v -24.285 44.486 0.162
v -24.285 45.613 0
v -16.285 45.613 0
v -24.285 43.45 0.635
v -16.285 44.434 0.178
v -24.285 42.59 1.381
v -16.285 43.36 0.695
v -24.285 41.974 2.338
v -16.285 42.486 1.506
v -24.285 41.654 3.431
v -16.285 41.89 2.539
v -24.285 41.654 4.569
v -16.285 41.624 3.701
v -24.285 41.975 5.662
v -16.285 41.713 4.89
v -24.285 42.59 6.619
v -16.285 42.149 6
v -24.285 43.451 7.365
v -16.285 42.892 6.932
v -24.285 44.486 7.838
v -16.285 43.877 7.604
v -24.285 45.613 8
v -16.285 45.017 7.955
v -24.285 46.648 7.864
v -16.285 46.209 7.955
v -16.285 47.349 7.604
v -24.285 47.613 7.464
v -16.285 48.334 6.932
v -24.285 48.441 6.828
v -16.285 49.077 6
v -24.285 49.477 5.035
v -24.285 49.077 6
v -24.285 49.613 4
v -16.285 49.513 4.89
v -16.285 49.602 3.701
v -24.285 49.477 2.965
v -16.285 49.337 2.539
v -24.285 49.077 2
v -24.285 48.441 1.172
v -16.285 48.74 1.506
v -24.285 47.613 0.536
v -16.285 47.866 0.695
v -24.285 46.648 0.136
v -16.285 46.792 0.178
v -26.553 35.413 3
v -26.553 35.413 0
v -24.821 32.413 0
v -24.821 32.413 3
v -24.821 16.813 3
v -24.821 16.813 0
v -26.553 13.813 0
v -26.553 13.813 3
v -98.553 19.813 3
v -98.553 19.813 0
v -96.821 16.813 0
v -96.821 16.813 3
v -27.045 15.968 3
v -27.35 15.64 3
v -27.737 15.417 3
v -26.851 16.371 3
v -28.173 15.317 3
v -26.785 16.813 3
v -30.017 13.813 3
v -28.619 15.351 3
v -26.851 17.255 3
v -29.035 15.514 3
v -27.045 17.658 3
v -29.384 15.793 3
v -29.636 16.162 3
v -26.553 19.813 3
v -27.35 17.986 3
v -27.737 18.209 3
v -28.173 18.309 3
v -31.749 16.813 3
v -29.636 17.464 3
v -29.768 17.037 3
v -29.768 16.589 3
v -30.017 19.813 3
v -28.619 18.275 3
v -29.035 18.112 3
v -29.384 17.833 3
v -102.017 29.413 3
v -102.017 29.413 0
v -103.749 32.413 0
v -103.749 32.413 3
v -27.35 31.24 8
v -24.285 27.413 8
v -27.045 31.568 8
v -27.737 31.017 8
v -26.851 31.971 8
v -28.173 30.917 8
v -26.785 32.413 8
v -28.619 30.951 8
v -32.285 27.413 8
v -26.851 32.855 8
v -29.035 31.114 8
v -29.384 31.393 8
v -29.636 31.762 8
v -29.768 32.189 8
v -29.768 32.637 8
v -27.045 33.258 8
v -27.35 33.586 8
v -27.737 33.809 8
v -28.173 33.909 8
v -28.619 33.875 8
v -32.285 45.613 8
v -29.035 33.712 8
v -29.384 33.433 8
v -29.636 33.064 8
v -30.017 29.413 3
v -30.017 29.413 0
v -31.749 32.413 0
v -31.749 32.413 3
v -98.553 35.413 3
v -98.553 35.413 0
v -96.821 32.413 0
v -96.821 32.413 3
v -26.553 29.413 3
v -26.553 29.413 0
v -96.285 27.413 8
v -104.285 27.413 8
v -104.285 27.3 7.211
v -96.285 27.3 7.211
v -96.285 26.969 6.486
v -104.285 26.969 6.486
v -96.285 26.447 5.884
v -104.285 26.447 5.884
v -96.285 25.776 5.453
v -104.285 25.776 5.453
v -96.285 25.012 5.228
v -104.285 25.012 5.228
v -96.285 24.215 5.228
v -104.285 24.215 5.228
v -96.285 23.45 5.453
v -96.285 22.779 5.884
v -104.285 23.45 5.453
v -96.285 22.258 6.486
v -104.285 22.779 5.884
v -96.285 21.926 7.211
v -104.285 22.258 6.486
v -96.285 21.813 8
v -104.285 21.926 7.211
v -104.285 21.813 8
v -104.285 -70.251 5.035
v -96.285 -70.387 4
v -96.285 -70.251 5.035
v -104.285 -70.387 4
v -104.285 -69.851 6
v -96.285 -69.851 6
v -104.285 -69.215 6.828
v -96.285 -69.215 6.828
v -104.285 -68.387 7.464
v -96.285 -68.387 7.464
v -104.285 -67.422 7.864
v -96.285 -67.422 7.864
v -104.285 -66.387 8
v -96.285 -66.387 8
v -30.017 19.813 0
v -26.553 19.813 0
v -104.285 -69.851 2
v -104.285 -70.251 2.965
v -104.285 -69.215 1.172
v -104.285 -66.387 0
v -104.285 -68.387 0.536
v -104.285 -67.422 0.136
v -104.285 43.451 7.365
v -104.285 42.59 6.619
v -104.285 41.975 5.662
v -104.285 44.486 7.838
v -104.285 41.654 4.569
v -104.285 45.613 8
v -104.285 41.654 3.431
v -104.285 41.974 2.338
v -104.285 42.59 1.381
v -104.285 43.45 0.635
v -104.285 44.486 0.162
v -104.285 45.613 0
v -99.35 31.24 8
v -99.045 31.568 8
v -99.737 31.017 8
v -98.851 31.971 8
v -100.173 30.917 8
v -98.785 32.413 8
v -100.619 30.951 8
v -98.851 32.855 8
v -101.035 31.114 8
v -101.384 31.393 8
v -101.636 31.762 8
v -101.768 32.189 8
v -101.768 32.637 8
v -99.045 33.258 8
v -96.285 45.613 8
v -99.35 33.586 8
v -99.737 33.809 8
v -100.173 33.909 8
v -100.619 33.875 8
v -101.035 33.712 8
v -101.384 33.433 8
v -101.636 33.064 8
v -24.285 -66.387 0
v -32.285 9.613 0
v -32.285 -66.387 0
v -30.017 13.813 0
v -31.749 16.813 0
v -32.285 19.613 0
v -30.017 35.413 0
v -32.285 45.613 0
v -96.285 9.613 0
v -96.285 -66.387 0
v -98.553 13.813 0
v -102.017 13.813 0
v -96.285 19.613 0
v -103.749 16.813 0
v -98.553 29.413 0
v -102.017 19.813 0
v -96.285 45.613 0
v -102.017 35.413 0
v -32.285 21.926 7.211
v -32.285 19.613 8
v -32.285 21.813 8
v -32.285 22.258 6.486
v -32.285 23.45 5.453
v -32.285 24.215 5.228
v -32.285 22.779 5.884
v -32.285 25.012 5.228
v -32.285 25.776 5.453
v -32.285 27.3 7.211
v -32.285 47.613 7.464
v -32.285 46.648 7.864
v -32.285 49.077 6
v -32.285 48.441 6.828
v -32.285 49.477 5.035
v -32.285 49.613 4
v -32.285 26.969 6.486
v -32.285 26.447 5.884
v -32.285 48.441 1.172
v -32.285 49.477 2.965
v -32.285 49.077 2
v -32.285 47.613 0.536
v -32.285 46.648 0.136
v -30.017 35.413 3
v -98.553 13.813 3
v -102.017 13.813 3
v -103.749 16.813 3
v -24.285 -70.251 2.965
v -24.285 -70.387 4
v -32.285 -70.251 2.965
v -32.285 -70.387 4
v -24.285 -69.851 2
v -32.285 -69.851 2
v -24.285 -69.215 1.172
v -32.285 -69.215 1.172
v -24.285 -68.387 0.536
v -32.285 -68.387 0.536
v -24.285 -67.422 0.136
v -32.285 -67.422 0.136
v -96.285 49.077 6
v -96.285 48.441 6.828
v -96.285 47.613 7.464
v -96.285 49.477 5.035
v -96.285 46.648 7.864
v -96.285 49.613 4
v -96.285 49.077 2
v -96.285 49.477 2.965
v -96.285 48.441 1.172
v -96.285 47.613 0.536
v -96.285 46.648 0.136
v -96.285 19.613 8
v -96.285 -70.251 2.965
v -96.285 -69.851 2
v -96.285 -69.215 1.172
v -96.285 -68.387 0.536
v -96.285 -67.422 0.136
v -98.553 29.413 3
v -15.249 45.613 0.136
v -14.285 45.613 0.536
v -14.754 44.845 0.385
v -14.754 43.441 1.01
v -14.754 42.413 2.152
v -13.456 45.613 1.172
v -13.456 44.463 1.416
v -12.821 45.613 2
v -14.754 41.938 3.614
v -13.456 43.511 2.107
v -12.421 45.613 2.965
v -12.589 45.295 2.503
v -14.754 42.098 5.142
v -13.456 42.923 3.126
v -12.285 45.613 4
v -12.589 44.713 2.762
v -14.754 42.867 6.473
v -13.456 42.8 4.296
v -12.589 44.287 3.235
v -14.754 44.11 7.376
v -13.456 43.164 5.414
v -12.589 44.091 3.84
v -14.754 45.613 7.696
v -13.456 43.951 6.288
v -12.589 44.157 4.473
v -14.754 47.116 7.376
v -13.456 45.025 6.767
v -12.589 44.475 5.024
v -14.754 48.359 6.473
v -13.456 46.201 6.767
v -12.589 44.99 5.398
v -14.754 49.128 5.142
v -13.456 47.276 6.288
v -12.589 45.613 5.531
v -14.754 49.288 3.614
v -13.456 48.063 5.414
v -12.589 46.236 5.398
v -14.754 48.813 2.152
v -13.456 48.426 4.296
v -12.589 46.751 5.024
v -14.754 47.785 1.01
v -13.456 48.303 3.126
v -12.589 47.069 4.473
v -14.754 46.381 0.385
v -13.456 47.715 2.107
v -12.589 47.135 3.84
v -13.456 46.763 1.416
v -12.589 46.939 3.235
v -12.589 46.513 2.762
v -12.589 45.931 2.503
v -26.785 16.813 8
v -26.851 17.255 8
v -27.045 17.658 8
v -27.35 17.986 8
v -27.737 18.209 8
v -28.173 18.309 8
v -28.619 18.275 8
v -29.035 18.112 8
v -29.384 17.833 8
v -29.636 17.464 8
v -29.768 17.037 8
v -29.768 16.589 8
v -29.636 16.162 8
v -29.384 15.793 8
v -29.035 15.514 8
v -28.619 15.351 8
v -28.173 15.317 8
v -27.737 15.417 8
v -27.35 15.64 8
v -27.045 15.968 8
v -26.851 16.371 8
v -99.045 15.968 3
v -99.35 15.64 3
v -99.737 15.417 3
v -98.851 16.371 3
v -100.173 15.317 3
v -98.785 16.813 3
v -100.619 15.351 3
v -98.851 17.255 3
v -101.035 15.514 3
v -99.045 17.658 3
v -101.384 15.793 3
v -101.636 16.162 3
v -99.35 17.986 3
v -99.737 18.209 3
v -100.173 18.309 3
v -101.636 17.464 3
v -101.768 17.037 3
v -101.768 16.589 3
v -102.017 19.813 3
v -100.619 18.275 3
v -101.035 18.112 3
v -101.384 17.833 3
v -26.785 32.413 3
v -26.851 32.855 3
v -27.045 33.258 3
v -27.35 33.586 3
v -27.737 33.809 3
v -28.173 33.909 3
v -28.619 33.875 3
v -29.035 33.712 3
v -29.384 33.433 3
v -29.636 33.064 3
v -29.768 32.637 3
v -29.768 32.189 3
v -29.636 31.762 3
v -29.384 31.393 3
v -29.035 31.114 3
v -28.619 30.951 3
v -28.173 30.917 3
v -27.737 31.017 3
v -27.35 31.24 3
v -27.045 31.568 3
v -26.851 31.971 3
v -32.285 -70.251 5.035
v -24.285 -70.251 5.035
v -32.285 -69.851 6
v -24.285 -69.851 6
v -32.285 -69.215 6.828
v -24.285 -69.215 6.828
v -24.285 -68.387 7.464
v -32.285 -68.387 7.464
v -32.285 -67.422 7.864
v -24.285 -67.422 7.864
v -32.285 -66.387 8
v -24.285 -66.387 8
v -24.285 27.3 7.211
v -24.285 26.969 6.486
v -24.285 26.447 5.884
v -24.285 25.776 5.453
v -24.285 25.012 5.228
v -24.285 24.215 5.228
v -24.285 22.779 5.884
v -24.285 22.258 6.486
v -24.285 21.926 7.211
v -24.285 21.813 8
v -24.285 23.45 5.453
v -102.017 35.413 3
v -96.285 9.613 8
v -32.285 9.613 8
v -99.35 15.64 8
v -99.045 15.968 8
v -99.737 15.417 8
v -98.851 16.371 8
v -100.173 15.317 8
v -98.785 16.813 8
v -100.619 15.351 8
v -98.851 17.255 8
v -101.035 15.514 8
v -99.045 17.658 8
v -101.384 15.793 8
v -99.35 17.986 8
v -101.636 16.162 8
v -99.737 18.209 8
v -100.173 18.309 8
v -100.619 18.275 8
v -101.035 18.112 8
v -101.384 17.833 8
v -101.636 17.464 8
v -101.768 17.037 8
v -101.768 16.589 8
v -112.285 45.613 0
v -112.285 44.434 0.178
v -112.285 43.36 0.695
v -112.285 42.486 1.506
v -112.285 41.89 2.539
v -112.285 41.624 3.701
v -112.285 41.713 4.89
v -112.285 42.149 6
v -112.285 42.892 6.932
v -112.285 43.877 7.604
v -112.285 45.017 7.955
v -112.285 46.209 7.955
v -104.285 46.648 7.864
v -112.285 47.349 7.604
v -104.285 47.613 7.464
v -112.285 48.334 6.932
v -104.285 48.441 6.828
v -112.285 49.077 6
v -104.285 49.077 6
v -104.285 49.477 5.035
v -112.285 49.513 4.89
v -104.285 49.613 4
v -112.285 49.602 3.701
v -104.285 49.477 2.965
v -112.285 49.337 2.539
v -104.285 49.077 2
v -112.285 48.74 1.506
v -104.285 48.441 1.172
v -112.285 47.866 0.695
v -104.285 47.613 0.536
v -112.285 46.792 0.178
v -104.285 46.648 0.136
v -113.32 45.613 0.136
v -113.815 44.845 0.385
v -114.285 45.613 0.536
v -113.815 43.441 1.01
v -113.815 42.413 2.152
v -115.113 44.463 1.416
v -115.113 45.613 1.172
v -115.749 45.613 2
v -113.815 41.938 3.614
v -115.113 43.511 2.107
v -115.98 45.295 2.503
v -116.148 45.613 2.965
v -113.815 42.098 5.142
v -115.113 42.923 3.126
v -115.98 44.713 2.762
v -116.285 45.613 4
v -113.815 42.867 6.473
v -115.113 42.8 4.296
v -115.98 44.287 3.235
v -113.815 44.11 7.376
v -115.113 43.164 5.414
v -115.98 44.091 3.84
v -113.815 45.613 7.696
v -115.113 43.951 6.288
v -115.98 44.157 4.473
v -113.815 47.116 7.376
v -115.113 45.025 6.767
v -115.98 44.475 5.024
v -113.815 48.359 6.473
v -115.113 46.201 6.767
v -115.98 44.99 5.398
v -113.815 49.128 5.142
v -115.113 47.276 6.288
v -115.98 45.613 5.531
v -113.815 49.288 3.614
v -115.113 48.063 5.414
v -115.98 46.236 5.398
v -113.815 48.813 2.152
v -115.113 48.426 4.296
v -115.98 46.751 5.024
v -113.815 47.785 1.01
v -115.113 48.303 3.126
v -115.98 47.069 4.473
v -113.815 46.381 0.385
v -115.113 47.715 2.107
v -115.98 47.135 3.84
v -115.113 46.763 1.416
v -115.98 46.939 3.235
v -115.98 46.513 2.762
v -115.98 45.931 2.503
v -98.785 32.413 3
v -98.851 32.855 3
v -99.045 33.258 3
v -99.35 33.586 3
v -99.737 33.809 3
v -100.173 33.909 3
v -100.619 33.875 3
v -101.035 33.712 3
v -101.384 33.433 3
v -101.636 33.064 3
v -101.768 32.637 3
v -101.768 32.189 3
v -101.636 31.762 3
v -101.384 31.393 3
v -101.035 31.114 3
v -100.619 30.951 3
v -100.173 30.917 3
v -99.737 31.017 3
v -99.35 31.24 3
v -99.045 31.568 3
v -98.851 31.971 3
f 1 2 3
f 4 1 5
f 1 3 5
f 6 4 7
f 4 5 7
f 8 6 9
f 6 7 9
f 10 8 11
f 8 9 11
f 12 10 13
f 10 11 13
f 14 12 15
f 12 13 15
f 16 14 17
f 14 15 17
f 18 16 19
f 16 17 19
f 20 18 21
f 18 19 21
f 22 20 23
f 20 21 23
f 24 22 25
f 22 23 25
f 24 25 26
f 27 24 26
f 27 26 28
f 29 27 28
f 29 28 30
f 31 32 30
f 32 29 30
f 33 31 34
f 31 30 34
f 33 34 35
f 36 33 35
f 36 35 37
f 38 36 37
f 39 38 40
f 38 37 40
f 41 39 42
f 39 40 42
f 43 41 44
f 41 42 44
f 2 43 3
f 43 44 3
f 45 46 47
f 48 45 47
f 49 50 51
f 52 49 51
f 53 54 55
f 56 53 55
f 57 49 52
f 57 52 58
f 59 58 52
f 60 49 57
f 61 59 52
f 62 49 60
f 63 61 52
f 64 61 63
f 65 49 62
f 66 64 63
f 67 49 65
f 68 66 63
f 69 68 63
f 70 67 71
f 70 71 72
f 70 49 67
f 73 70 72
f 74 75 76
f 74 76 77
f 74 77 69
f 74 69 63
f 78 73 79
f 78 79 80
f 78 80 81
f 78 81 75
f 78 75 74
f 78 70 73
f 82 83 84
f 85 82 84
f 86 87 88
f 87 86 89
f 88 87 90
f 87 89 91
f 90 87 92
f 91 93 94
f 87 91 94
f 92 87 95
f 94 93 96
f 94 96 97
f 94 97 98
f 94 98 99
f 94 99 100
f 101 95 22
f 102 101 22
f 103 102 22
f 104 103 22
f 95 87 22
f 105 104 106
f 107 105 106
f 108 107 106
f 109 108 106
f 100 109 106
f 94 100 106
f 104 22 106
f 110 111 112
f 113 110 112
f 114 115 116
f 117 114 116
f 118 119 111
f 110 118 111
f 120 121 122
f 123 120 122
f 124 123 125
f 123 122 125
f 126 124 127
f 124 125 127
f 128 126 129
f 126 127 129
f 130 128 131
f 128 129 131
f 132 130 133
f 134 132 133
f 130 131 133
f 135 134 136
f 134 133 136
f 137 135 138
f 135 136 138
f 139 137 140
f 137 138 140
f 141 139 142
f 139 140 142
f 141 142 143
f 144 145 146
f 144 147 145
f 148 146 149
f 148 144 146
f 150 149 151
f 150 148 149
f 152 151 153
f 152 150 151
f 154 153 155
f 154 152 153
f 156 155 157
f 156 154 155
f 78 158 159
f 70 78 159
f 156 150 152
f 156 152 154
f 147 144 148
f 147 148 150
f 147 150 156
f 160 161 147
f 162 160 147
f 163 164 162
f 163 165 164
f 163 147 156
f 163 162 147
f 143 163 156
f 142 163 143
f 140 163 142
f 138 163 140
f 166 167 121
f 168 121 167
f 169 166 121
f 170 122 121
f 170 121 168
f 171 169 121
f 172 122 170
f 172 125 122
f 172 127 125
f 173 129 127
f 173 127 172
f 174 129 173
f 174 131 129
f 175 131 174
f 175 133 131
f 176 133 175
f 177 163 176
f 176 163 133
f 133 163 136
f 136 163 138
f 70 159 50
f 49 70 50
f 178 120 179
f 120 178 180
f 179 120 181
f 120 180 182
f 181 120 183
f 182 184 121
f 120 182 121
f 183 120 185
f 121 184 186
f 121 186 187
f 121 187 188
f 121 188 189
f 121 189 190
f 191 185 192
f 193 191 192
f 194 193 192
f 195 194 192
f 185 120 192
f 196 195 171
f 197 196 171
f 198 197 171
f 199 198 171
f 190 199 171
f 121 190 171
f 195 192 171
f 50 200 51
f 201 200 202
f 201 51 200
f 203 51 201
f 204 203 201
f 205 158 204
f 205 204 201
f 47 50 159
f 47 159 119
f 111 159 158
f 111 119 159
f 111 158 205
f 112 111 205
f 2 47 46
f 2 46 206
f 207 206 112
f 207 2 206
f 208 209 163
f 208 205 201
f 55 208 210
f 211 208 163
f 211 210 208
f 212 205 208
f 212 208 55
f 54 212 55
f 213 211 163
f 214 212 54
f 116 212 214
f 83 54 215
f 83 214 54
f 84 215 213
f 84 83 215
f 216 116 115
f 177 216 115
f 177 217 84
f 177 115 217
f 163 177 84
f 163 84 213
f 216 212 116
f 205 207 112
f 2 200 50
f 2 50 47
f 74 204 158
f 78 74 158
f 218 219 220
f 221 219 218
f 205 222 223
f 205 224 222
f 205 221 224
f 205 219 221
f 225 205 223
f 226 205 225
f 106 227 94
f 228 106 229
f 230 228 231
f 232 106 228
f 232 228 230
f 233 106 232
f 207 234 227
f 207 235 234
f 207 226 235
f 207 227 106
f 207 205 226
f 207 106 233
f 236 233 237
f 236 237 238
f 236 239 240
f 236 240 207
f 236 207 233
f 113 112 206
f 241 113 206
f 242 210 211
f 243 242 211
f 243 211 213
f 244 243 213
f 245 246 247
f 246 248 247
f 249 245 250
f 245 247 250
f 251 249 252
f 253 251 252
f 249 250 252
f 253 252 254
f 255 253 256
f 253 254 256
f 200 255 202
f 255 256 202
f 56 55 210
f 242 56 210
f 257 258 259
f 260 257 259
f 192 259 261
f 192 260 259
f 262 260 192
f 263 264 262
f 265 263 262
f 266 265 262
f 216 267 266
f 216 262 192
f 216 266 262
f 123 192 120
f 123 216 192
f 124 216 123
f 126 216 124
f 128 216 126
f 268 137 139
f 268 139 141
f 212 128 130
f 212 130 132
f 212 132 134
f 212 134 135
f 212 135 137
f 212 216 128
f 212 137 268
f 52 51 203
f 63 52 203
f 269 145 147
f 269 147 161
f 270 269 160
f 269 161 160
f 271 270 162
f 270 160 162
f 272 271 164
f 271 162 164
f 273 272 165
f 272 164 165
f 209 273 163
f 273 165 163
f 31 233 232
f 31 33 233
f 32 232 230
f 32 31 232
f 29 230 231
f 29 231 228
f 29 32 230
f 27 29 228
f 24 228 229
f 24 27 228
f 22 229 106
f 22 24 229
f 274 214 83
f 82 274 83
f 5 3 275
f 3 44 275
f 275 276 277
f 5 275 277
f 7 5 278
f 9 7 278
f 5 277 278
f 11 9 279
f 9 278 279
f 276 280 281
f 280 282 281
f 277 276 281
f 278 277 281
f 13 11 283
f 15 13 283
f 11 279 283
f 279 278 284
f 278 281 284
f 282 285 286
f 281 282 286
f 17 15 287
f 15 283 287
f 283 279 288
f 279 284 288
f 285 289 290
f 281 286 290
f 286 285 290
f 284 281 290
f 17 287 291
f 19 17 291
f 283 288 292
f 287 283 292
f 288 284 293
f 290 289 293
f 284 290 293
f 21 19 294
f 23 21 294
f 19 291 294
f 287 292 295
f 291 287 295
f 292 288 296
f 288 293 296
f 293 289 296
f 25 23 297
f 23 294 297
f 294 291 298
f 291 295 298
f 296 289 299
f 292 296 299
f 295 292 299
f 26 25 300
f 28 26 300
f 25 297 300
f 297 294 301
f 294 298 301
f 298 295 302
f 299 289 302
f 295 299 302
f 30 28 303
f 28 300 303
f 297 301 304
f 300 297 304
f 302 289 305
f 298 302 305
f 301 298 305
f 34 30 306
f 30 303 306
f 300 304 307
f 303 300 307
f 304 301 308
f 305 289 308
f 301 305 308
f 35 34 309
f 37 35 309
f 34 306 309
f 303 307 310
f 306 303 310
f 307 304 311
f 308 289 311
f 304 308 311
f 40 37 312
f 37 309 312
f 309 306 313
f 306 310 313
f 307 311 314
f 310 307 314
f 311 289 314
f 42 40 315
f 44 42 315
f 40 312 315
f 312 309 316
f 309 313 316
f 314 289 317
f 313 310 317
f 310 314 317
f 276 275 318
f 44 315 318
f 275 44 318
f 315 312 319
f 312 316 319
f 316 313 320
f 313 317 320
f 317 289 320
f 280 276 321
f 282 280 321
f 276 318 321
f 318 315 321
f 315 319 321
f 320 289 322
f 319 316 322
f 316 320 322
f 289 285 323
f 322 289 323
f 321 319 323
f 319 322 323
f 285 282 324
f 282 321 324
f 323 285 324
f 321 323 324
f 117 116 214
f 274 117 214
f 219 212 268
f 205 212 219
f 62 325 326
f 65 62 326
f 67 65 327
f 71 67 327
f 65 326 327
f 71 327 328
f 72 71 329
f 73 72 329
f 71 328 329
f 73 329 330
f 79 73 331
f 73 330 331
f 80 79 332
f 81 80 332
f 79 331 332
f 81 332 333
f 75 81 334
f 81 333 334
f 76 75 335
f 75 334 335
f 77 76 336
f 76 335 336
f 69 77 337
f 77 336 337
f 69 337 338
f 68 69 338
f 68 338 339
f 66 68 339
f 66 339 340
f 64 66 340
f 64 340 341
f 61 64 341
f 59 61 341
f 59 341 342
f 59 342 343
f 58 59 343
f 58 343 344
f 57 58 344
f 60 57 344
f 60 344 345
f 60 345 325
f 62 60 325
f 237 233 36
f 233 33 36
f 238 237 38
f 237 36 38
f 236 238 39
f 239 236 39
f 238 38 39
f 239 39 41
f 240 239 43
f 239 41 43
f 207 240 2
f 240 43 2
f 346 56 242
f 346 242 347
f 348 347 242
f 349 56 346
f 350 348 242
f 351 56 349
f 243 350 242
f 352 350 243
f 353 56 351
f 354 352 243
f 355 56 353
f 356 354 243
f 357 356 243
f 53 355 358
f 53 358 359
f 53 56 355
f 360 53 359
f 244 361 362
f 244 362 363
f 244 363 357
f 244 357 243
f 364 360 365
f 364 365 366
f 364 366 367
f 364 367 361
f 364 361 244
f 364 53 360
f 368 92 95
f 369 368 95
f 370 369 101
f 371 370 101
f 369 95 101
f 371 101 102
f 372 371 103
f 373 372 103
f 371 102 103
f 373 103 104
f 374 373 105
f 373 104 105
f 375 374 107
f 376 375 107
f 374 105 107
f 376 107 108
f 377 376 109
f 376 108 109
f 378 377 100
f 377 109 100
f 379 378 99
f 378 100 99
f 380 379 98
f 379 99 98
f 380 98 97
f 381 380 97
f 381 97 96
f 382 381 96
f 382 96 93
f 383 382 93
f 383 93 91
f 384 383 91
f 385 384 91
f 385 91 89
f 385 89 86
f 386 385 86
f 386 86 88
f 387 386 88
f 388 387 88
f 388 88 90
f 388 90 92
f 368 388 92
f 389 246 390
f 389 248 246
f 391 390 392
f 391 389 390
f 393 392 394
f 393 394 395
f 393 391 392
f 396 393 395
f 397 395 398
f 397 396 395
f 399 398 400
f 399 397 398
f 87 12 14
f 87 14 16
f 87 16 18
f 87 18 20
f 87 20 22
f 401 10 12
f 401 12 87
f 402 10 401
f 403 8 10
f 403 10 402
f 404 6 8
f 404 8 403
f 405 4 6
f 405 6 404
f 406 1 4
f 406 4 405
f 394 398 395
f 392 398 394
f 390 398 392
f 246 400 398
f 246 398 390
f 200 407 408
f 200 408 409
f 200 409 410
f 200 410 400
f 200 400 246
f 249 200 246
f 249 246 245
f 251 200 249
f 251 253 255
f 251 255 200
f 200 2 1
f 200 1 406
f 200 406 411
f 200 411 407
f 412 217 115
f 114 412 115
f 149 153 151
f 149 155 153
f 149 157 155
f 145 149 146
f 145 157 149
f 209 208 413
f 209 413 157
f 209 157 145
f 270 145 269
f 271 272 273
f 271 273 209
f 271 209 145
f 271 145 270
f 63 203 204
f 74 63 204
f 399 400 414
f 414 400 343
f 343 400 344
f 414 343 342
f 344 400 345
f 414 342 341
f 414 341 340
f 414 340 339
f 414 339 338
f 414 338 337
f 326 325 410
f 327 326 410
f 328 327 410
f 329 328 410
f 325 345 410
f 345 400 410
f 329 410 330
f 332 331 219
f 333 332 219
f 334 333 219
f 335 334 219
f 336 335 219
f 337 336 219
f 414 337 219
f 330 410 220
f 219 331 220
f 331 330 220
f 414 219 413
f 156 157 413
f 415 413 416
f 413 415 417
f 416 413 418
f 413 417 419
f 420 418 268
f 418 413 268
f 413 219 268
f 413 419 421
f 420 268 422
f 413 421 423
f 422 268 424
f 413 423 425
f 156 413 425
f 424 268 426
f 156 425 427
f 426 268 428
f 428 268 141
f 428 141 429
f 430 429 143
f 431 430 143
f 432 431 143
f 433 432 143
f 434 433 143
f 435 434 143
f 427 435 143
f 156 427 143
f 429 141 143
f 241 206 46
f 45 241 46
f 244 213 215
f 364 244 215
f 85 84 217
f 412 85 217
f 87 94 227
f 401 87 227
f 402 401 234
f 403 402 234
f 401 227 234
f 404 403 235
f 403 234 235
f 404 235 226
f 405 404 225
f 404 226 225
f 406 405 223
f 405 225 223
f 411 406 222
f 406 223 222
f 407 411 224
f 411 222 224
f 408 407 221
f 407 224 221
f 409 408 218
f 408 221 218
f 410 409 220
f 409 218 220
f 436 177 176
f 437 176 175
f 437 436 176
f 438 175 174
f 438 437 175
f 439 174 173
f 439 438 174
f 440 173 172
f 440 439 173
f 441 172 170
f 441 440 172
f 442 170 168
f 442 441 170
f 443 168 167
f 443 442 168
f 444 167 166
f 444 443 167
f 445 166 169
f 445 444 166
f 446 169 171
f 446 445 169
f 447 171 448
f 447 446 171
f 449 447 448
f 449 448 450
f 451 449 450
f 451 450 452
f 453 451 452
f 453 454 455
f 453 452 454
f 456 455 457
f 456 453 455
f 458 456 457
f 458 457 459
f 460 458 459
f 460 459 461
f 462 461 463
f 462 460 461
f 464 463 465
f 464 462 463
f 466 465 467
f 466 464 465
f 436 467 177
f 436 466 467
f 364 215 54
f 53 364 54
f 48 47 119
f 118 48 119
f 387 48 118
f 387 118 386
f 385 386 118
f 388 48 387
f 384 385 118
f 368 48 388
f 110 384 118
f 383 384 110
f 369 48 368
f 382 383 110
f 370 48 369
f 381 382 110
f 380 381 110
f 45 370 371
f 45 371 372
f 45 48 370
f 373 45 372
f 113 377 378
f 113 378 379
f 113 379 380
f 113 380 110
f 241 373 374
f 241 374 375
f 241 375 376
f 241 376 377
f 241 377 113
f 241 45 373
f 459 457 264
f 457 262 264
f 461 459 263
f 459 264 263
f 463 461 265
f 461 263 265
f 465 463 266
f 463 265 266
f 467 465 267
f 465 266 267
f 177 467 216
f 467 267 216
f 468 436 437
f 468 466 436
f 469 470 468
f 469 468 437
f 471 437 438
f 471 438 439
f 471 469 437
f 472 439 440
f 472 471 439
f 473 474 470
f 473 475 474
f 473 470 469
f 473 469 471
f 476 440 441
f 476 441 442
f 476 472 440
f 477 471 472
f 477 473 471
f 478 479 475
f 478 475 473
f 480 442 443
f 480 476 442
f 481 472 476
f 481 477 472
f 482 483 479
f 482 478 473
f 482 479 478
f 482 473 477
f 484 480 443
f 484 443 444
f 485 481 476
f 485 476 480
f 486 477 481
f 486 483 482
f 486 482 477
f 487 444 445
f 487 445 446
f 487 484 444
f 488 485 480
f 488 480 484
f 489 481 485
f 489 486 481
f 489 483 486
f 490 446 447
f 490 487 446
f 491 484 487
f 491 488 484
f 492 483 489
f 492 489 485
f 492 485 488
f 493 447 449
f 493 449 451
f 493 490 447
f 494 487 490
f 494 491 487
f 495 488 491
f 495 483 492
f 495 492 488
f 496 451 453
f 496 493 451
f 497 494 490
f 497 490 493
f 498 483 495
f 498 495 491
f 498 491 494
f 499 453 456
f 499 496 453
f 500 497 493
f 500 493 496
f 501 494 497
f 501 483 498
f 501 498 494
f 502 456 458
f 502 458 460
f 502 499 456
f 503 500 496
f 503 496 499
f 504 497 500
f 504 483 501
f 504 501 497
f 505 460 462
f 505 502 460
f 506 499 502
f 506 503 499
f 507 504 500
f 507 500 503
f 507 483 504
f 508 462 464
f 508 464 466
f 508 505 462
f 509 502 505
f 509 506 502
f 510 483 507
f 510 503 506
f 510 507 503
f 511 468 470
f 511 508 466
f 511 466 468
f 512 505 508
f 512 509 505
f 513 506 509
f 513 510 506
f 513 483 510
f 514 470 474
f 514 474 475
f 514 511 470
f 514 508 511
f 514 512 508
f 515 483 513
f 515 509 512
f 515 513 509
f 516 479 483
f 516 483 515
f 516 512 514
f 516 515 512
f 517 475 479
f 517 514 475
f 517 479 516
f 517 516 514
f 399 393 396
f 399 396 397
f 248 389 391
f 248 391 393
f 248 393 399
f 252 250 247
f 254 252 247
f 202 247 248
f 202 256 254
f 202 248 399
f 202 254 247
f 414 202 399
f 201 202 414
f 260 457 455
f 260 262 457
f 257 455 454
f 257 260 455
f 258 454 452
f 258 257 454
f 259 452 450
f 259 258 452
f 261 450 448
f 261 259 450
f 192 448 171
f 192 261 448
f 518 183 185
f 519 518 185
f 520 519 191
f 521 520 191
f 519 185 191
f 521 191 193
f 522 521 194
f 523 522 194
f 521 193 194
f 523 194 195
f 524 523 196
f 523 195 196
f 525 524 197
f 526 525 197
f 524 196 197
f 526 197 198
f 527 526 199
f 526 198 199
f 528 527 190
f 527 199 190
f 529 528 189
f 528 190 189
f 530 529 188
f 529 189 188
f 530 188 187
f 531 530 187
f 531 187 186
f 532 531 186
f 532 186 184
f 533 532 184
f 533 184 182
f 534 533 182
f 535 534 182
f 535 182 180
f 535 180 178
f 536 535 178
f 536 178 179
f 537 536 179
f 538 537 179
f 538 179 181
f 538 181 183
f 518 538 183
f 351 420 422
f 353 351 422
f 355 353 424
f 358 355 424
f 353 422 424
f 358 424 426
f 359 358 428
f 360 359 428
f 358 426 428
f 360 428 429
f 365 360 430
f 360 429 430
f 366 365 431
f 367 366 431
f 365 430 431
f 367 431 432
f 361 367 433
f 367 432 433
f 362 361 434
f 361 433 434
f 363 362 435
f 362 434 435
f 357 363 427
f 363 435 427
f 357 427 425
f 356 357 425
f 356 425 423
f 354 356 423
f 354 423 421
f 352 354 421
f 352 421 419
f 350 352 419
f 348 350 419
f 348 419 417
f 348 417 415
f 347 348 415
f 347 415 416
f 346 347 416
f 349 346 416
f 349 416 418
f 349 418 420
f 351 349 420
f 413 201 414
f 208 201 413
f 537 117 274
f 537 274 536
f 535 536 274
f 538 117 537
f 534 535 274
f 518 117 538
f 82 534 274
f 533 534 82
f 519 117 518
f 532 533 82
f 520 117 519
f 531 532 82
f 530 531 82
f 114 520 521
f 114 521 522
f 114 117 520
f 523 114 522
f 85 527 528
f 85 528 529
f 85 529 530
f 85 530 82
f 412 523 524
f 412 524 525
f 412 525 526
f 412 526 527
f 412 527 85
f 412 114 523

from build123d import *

# Parameters (mm, degrees)
SALIENTE_EXTRUIR1_DEPTH = 8
REDONDEO1_R             = 4
CROQUIS6_R              = 2.8
CORTAR_EXTRUIR1_DEPTH   = 80.000001
CROQUIS7_R              = 1.5
CORTAR_EXTRUIR2_DEPTH   = 8
CORTAR_EXTRUIR3_DEPTH   = 3


with BuildPart() as part:
    # Croquis1 → Saliente-Extruir1 (new body)
    with BuildSketch(Plane.XY):
        Polygon((-96.284761278, 9.613034623), (-96.284761278, -70.386965377), (-104.284761278, -70.386965377), (-104.284761278, 49.613034623), (-96.284761278, 49.613034623), (-96.284761278, 19.613034623), (-32.284761278, 19.613034623), (-32.284761278, 49.613034623), (-24.284761278, 49.613034623), (-24.284761278, -70.386965377), (-32.284761278, -70.386965377), (-32.284761278, 9.613034623), align=None)
    extrude(amount=SALIENTE_EXTRUIR1_DEPTH)

    # Redondeo1
    redondeo1_edges = [part.edges().sort_by_distance(p)[0] for p in [
        (-100.284761278, -70.386965377, 0),
        (-28.284761278, -70.386965377, 0),
        (-28.284761278, 49.613034623, 8),
        (-28.284761278, 49.613034623, 0),
        (-100.284761278, 49.613034623, 0),
        (-100.284761278, 49.613034623, 8),
        (-28.284761278, -70.386965377, 8),
        (-100.284761278, -70.386965377, 8),
    ]]
    fillet(redondeo1_edges, radius=REDONDEO1_R - 0.0001)  # a hair under: the kernel refuses the full size

    # Croquis4 → Revolución3 (revolve)
    with BuildSketch(Plane.XY.offset(4), mode=Mode.PRIVATE) as revoluci_n3_sk:
        with BuildLine():
            Line((-104.284761278, 49.613034623), (-112.284761278, 49.613034623))
            ThreePointArc((-112.284761278, 49.613034623), (-115.113188403, 48.441461748), (-116.284761278, 45.613034623))
            Line((-116.284761278, 45.613034623), (-104.284761278, 45.613034623))
            Line((-104.284761278, 45.613034623), (-104.284761278, 49.613034623))
        make_face()
    revoluci_n3 = revolve(revoluci_n3_sk.sketch.rotate(Axis((-104.284761278, 45.613034623, 4), (-1, 0, 0)), 90), axis=Axis((-104.284761278, 45.613034623, 4), (-1, 0, 0)))

    # Simetría1: Revolución3 across plane
    add(revoluci_n3.mirror(Plane.ZY.offset(64.284761278)))

    # Croquis6 → Cortar-Extruir1 (cut)
    with BuildSketch(Plane.ZY.offset(104.284761278)):
        with Locations((8, 24.613034623)):
            Circle(CROQUIS6_R)
    extrude(amount=-CORTAR_EXTRUIR1_DEPTH, mode=Mode.SUBTRACT)

    # Croquis7 → Cortar-Extruir2 (cut)
    with BuildSketch(Plane.XY.offset(8)):
        with Locations((-100.284761278, 16.813034623)):
            Circle(CROQUIS7_R)
        with Locations((-28.284761278, 16.813034623)):
            Circle(CROQUIS7_R)
        with Locations((-28.284761278, 32.413034623)):
            Circle(CROQUIS7_R)
        with Locations((-100.284761278, 32.413034623)):
            Circle(CROQUIS7_R)
    extrude(amount=-CORTAR_EXTRUIR2_DEPTH, mode=Mode.SUBTRACT)

    # Croquis8 → Cortar-Extruir3 (cut)
    with BuildSketch(Plane(origin=(0, 0, 0), x_dir=(-1, 0, 0), z_dir=(0, 0, -1))):
        Polygon((103.748862893, 16.813034623), (102.016812085, 19.813034623), (98.55271047, 19.813034623), (96.820659663, 16.813034623), (98.55271047, 13.813034623), (102.016812085, 13.813034623), align=None)
        Polygon((31.748862893, 16.813034623), (30.016812085, 19.813034623), (26.55271047, 19.813034623), (24.820659663, 16.813034623), (26.55271047, 13.813034623), (30.016812085, 13.813034623), align=None)
        Polygon((103.748862893, 32.413034623), (102.016812085, 35.413034623), (98.55271047, 35.413034623), (96.820659663, 32.413034623), (98.55271047, 29.413034623), (102.016812085, 29.413034623), align=None)
        Polygon((31.748862893, 32.413034623), (30.016812085, 35.413034623), (26.55271047, 35.413034623), (24.820659663, 32.413034623), (26.55271047, 29.413034623), (30.016812085, 29.413034623), align=None)
    extrude(amount=-CORTAR_EXTRUIR3_DEPTH, mode=Mode.SUBTRACT)


solid = part.part
